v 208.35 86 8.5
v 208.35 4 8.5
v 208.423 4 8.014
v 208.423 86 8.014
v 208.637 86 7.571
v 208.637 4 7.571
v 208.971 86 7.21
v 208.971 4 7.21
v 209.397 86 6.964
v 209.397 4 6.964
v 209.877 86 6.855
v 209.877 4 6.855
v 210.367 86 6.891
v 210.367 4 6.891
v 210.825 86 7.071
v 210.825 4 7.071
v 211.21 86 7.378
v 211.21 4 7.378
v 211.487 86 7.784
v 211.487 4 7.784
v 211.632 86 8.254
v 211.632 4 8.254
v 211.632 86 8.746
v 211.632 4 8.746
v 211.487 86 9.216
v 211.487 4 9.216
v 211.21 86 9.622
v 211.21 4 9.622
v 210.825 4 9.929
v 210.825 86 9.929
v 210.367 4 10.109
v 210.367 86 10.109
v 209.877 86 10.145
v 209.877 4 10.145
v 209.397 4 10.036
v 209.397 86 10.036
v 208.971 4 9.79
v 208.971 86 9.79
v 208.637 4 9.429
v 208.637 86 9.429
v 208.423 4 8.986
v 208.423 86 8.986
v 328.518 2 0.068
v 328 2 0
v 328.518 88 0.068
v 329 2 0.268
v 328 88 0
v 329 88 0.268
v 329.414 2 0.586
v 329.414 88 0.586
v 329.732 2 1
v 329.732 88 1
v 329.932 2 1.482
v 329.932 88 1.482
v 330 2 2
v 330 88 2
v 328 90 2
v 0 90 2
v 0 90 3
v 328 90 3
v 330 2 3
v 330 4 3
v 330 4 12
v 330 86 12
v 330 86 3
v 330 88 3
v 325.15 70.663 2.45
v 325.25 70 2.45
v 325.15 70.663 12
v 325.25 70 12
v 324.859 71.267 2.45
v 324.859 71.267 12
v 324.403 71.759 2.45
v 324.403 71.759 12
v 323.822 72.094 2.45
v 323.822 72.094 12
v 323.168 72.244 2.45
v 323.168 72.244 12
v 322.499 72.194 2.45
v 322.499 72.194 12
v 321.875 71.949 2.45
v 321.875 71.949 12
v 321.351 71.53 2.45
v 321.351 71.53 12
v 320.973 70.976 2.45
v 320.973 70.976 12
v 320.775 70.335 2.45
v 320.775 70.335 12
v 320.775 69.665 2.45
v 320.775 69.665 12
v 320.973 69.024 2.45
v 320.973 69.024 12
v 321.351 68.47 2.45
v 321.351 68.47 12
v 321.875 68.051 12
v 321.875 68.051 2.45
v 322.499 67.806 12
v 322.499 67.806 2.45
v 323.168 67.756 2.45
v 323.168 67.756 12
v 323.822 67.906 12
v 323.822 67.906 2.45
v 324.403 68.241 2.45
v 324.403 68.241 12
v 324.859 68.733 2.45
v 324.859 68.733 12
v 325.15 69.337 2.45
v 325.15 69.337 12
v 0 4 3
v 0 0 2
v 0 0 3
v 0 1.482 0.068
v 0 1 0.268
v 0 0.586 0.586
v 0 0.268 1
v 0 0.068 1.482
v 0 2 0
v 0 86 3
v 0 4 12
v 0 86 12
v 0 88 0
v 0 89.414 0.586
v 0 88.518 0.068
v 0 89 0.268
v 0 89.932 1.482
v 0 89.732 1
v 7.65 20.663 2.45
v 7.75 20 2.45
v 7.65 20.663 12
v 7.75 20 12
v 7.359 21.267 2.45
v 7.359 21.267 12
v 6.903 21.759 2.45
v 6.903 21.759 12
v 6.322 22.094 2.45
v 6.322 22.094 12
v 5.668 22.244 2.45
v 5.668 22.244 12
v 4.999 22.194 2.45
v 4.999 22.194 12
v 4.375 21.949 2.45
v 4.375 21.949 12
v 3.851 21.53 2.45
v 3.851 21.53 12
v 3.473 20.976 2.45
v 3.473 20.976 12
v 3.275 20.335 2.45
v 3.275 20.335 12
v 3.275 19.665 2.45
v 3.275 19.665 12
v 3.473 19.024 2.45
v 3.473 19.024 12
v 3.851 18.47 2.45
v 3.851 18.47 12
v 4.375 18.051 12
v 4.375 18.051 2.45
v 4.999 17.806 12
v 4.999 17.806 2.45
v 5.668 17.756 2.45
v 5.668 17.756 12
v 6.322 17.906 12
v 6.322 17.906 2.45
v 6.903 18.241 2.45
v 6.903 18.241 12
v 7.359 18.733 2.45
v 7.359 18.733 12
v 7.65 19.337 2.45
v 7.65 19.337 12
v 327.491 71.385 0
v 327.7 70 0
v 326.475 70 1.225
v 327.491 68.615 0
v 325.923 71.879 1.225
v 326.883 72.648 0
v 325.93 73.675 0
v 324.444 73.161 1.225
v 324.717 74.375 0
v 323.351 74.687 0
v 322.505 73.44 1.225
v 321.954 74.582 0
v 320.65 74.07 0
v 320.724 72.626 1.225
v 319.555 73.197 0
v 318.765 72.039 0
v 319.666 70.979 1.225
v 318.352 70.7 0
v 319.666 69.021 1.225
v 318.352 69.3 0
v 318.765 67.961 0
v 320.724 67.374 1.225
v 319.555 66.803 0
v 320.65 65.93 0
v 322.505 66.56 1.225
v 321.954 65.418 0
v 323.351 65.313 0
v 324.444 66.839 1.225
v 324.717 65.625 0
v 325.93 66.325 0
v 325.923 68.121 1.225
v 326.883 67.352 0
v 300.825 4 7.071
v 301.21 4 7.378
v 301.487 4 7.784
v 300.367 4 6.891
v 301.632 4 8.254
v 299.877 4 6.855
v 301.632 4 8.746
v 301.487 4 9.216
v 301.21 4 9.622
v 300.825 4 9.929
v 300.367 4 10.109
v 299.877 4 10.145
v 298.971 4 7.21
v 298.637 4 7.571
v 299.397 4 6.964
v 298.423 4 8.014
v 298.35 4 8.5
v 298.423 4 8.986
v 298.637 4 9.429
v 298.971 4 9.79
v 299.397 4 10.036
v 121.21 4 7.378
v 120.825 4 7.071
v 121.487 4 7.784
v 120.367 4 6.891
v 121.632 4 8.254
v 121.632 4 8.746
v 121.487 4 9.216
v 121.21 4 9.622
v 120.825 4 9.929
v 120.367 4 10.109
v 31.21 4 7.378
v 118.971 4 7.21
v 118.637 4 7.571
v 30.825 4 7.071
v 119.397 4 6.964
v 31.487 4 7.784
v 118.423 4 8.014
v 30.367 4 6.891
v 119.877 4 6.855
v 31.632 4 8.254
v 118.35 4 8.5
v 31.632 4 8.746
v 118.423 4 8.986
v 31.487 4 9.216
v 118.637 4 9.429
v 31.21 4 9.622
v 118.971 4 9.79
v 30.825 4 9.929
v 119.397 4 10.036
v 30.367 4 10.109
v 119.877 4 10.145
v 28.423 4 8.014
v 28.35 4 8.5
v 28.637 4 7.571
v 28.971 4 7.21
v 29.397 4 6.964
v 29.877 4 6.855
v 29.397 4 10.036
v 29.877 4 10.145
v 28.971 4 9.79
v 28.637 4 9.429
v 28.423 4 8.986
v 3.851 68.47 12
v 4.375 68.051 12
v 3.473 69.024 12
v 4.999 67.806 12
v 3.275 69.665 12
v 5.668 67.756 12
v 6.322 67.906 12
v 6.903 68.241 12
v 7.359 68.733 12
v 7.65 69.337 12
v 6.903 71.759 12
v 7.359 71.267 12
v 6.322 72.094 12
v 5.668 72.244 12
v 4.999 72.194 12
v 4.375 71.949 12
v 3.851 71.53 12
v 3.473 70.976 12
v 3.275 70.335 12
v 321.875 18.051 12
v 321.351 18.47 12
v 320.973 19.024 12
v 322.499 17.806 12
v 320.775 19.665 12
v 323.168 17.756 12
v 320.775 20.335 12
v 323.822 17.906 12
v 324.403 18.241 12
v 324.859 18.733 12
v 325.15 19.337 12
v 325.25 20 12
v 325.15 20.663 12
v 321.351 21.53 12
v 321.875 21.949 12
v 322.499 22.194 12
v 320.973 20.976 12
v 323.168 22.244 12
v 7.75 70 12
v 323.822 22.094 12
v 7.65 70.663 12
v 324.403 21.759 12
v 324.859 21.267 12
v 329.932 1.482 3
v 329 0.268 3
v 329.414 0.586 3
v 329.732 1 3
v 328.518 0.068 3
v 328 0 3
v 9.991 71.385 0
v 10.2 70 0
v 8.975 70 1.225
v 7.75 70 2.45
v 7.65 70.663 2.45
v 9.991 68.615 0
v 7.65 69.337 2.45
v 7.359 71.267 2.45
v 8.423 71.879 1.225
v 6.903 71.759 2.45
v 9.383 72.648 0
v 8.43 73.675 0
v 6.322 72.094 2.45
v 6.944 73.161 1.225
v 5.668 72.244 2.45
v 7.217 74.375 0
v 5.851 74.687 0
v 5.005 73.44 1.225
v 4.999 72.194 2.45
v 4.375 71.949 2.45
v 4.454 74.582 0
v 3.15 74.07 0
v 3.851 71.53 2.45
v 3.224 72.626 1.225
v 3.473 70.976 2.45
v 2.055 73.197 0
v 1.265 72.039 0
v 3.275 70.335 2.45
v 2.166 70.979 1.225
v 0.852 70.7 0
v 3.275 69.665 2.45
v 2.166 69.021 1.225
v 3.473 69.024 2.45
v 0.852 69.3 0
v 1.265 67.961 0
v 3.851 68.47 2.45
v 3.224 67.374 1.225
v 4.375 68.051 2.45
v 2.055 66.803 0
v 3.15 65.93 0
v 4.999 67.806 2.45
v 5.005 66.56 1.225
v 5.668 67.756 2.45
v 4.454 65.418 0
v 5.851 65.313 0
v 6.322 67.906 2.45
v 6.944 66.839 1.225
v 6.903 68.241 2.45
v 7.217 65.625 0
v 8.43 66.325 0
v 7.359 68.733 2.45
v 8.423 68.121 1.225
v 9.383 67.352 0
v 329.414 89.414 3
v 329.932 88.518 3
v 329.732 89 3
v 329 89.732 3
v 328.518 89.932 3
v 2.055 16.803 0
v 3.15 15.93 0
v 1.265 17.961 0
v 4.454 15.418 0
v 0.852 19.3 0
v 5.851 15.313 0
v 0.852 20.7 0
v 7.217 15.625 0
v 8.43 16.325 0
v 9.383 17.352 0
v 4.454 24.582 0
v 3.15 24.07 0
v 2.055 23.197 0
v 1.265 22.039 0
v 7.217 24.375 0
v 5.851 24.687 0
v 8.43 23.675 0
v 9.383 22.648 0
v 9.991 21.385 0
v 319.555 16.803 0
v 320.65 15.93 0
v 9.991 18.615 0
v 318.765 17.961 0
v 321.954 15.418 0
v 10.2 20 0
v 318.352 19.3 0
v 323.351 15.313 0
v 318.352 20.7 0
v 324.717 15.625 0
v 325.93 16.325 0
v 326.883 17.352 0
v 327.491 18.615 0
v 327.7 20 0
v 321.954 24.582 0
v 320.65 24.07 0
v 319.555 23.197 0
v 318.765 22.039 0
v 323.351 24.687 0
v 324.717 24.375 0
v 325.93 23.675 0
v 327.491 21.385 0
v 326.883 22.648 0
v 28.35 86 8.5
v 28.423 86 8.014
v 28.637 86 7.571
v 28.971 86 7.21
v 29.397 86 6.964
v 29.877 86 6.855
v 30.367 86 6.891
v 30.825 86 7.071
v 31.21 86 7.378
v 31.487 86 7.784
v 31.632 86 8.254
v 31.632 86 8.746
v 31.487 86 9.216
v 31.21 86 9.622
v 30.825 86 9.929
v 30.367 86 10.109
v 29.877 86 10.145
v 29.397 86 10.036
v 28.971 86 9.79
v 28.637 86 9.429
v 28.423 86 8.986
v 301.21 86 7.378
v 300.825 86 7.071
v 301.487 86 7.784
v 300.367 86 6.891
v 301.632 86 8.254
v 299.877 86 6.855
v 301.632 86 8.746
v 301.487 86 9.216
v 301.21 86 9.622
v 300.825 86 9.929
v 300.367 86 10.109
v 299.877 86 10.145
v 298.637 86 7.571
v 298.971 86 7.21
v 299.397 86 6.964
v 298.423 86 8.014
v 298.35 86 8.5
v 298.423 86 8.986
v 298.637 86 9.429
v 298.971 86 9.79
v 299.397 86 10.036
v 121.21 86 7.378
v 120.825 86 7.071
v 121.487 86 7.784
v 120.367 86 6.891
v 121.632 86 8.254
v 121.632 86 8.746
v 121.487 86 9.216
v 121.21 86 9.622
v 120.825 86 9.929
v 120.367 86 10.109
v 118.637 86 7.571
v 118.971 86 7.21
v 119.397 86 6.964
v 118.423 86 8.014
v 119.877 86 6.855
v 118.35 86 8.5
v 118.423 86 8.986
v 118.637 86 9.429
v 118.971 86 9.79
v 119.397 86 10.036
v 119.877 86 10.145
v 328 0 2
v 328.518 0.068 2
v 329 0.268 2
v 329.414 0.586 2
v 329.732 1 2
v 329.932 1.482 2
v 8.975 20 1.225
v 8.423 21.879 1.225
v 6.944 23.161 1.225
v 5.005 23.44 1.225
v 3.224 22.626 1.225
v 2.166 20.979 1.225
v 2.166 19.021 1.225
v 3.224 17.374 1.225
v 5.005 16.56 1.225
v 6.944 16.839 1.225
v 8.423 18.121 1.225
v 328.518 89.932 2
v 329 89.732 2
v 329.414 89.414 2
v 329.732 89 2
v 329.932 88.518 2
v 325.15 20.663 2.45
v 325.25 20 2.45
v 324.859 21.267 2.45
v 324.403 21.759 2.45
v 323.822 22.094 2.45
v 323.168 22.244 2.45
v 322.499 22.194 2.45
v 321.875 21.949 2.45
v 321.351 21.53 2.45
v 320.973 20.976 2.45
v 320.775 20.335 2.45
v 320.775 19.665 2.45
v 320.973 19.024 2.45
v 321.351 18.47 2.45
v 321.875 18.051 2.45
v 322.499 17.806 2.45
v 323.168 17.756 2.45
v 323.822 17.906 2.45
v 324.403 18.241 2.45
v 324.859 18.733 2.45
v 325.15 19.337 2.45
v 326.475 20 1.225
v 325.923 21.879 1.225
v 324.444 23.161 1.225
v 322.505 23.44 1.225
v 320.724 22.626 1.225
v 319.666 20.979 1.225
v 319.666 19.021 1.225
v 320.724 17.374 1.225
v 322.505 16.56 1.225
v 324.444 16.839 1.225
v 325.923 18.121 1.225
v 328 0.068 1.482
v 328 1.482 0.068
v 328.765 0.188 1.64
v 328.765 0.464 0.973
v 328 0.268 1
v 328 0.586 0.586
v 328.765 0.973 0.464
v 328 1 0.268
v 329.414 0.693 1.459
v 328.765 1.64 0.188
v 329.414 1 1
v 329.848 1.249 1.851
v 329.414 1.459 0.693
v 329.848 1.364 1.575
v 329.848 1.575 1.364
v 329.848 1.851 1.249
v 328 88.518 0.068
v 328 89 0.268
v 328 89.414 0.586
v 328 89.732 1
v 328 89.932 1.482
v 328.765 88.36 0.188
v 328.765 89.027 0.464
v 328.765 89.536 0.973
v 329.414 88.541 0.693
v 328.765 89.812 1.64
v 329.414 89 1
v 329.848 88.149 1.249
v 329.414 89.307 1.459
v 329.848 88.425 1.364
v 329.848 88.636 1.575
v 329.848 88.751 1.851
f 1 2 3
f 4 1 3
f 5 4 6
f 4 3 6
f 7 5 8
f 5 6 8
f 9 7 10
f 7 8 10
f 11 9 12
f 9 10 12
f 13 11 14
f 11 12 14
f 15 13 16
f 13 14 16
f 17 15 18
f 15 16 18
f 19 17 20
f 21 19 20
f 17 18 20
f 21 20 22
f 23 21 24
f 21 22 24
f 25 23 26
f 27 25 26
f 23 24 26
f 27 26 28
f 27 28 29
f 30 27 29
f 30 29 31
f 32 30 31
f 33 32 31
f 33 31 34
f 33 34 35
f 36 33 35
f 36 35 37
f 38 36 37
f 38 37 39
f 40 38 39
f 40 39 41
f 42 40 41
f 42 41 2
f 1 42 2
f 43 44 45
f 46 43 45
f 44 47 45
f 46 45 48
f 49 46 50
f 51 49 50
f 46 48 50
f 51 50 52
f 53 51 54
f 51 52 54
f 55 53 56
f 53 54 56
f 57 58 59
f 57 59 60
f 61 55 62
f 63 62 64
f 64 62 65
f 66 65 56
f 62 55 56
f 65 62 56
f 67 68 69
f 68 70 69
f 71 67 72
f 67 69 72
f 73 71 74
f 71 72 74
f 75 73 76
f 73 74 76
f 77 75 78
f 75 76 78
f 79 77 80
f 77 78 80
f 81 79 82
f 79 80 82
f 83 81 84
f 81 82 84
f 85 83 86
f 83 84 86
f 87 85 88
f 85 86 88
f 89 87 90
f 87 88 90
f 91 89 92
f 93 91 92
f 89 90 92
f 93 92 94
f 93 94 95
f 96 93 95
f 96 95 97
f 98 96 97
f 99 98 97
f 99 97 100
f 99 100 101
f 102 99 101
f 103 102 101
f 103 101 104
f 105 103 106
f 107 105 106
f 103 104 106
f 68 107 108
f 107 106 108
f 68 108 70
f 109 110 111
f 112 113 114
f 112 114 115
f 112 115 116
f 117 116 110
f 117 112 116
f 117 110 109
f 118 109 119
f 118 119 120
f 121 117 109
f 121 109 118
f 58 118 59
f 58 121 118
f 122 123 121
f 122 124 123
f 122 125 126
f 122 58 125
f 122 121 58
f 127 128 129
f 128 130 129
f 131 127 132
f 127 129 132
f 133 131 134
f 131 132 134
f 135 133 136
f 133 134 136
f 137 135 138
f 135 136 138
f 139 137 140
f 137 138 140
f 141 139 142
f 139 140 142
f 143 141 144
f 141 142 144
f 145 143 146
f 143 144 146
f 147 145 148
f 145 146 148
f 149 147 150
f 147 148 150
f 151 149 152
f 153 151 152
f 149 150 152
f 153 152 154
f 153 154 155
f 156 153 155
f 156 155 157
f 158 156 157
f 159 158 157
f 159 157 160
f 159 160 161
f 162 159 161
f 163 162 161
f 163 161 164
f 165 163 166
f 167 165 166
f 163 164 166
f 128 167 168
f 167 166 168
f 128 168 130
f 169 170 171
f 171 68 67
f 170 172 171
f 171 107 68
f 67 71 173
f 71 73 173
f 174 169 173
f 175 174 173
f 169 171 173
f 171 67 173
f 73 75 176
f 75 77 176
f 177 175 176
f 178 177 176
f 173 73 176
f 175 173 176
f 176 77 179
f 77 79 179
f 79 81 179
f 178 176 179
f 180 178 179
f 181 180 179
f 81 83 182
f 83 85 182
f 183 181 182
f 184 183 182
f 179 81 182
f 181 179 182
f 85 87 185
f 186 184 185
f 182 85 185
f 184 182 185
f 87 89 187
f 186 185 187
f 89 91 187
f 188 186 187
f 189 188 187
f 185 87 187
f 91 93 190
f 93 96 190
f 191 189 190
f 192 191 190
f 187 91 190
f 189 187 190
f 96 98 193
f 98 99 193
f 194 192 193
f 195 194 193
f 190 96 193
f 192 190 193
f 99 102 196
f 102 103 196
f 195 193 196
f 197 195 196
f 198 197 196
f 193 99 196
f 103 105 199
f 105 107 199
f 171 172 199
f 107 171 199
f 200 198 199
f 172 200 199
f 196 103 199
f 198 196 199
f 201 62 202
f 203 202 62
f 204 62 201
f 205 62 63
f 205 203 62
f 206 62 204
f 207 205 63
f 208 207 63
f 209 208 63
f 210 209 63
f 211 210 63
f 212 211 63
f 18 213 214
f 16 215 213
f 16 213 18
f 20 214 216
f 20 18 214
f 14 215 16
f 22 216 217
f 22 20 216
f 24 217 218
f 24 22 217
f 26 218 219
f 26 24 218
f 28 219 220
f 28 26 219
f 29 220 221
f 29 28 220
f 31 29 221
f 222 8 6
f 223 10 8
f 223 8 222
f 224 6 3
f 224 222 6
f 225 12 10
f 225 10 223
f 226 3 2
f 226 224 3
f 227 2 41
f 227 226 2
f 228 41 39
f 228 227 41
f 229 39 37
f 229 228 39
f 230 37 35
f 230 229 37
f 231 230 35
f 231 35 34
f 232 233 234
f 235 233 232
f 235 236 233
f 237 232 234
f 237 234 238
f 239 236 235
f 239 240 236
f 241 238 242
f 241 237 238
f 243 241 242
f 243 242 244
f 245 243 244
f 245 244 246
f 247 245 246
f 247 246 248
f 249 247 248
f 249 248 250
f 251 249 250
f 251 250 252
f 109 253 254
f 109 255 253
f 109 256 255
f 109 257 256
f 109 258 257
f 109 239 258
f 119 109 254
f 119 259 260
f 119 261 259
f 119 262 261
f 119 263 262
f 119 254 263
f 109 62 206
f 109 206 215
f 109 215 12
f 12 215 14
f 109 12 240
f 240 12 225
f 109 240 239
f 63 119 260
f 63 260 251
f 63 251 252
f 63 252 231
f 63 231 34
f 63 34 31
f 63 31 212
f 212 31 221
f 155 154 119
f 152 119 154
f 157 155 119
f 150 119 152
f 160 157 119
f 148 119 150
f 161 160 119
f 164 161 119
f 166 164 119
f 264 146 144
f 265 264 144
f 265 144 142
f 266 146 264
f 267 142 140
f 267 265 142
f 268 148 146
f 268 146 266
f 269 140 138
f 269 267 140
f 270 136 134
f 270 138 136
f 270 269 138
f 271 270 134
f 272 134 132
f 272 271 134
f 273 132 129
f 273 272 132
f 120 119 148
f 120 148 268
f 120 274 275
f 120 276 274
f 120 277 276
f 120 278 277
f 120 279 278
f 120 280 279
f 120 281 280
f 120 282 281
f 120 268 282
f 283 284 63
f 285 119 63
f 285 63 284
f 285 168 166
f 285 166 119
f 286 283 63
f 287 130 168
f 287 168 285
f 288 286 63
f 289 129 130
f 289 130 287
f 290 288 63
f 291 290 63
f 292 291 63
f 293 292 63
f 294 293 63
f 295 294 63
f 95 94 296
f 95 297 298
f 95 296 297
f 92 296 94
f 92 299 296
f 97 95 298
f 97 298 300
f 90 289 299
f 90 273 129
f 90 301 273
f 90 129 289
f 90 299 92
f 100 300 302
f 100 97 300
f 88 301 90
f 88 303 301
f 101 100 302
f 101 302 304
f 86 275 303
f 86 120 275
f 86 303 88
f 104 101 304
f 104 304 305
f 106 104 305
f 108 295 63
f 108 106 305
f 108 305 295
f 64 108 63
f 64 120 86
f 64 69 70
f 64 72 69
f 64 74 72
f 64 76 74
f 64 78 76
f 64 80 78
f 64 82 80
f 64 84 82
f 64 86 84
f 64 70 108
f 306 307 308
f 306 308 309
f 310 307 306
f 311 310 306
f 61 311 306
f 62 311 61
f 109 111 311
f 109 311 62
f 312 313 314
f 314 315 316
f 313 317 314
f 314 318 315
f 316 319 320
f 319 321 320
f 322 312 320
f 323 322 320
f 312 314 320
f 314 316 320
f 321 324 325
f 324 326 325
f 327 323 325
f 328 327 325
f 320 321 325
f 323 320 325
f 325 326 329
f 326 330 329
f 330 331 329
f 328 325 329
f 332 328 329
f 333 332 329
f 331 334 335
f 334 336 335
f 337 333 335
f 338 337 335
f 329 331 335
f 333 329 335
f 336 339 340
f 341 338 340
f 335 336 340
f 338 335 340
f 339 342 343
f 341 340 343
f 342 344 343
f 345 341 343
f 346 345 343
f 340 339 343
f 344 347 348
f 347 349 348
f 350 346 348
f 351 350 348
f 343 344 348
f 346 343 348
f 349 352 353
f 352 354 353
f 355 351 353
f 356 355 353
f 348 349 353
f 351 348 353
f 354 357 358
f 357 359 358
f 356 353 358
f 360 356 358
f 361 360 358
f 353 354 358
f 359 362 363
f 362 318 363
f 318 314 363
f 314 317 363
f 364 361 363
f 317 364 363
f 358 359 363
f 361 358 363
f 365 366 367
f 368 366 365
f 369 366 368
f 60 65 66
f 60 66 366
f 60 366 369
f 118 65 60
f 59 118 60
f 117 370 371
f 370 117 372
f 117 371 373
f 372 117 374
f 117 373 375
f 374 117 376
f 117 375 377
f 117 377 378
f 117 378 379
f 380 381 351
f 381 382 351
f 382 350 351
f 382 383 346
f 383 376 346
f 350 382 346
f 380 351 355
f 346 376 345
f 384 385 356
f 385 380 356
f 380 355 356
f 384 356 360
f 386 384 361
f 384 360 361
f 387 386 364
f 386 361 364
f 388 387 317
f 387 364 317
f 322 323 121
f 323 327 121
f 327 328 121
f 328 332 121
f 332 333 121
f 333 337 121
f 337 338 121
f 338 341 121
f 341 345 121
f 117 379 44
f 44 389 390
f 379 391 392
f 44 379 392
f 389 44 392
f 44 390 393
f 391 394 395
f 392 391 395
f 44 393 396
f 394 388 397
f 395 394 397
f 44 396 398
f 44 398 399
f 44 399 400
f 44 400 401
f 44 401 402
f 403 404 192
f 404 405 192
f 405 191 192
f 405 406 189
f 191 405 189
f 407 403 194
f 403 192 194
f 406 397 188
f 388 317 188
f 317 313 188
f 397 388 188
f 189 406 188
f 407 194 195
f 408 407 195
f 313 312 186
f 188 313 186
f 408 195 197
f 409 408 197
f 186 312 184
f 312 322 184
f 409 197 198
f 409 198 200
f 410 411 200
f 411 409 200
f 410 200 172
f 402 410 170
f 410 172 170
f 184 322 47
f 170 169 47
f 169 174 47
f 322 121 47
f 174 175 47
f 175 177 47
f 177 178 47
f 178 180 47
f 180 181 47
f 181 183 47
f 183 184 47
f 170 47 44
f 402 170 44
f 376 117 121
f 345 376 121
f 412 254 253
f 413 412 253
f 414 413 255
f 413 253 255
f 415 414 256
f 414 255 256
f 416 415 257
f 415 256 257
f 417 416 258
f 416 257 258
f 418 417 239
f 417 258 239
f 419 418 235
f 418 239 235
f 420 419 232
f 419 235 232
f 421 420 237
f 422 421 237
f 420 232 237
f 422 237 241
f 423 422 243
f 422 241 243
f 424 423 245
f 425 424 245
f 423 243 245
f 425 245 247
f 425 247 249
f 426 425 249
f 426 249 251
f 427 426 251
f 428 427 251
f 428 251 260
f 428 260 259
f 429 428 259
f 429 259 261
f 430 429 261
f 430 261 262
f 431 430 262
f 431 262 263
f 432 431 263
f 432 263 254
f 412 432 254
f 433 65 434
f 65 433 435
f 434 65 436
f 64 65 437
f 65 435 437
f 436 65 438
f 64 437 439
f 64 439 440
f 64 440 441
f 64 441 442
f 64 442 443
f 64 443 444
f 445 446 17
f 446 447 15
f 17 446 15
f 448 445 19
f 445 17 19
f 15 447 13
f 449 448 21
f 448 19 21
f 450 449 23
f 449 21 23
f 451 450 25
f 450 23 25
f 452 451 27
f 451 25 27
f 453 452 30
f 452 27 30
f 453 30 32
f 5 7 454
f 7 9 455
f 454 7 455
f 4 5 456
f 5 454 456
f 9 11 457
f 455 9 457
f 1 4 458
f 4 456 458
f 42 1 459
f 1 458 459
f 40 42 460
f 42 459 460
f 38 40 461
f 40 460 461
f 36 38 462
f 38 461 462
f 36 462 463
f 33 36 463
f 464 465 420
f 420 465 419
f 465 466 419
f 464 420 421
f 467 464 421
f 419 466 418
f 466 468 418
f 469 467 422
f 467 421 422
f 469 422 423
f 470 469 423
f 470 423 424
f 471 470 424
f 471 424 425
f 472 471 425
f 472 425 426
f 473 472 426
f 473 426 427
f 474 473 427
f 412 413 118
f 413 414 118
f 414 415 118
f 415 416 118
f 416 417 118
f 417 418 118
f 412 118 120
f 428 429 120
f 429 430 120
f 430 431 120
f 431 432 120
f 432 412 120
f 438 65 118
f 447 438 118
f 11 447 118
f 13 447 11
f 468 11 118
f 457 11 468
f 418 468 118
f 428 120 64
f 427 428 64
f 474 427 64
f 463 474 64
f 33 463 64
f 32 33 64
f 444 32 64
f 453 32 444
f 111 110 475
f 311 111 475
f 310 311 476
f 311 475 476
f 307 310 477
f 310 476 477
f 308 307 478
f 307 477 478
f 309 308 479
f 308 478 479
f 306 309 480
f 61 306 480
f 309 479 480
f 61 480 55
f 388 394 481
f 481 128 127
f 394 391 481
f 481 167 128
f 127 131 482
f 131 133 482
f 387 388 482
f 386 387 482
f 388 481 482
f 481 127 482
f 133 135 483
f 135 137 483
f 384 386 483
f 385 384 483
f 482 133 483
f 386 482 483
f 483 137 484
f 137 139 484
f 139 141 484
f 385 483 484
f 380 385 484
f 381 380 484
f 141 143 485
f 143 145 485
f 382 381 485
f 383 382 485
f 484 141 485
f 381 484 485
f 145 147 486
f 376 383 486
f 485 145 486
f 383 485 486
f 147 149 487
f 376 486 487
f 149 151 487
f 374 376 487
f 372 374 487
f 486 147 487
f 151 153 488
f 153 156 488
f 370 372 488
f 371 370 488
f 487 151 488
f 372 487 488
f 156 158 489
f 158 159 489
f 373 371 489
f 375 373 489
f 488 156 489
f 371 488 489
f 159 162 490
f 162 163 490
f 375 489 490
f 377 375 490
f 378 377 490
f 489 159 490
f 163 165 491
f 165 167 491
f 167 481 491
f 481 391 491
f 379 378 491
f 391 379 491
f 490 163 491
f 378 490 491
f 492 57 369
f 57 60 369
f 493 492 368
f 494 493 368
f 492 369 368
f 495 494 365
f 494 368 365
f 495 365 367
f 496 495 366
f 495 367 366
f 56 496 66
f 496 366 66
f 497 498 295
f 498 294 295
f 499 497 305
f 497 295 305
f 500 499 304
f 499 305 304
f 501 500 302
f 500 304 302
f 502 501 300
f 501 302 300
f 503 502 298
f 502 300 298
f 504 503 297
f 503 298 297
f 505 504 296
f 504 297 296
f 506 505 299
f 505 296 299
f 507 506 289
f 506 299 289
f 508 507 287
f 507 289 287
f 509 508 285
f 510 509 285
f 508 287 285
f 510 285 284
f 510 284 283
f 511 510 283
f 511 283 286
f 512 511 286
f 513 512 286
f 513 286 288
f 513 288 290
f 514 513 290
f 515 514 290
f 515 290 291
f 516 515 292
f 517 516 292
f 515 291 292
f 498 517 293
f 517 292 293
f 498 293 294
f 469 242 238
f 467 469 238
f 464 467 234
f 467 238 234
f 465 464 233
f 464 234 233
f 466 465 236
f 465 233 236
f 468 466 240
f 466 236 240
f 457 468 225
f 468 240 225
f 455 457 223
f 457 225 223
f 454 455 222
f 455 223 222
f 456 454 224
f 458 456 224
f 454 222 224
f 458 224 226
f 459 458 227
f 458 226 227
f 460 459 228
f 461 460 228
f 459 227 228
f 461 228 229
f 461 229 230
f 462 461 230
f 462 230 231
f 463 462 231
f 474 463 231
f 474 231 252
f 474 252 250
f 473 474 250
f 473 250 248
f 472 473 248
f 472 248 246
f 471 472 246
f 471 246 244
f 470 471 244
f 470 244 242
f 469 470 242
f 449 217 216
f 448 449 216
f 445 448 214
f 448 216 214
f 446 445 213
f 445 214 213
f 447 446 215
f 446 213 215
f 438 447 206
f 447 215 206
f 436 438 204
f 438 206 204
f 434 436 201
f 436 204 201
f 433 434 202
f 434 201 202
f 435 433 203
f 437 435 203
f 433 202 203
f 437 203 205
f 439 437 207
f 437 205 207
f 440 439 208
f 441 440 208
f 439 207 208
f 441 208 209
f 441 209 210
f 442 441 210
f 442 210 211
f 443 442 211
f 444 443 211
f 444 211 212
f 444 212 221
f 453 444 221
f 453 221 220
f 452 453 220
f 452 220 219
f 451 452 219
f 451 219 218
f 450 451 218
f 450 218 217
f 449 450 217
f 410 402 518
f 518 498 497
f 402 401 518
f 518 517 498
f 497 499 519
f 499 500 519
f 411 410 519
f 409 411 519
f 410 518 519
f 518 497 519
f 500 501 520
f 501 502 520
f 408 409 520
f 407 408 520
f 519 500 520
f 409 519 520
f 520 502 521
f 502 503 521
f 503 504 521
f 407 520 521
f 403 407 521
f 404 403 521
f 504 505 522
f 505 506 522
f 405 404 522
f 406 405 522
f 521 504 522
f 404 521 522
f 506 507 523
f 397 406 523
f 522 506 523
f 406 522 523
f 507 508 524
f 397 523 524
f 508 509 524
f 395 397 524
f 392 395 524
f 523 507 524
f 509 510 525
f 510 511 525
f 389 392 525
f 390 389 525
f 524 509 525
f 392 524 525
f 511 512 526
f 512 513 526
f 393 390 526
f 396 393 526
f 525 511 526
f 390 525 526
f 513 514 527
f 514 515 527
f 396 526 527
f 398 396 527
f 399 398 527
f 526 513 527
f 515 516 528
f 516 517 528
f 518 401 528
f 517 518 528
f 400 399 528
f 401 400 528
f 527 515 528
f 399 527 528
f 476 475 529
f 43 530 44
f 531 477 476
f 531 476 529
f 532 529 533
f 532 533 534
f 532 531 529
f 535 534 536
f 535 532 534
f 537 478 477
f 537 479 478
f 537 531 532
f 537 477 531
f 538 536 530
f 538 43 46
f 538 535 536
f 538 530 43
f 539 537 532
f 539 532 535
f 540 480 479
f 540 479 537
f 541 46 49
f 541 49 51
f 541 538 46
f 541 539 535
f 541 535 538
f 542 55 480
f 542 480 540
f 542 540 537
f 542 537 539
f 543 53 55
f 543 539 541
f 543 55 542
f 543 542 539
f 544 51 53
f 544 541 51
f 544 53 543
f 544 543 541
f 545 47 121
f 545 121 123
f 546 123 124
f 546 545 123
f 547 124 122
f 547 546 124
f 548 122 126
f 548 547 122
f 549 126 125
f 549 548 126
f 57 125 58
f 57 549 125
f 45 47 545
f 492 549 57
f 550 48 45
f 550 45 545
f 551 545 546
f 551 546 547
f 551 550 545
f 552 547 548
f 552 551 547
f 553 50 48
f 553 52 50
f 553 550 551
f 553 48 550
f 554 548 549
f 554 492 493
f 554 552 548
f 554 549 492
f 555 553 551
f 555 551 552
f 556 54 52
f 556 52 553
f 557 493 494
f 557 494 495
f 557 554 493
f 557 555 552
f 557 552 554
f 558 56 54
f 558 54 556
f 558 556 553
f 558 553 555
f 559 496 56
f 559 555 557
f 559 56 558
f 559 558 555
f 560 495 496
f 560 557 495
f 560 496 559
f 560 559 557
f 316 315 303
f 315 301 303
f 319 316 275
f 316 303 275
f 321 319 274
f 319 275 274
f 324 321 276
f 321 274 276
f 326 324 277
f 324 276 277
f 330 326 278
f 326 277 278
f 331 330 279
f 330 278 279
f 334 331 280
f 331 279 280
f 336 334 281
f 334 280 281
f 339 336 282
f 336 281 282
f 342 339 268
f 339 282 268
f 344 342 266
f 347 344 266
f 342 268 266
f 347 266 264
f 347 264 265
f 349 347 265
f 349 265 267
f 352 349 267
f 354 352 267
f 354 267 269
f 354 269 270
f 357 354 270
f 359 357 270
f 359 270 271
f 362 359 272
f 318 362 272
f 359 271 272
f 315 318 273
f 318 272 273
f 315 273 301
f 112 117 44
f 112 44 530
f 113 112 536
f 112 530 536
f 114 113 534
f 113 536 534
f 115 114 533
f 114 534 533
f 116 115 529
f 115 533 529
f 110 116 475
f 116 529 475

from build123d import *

# Parameters (mm, degrees)
SKETCH_1_W                     = 330
SKETCH_1_H                     = 90
EXTRUDE_1_DEPTH                = 12
SKETCH_2_W                     = 9
SKETCH_2_H                     = 4
CUT_EXTRUDE_1_DEPTH            = 331
FILLET_1_R                     = 2
FILLET_2_R                     = 2
HOLE_WIZARD_M4_1_D             = 3.3
HOLE_WIZARD_M4_1_2_D           = 4.5
HOLE_WIZARD_M4_1_2_CSINK_D     = 9.4
HOLE_WIZARD_M4_1_2_CSINK_ANGLE = 90


with BuildPart() as part:
    # 草圖1 → 填料-伸長1 (new body)
    with BuildSketch(Plane.XY):
        with Locations((165, 45)):
            Rectangle(SKETCH_1_W, SKETCH_1_H)
    extrude(amount=EXTRUDE_1_DEPTH)

    # 草圖2 → 除料-伸長1 (cut, through all)
    with BuildSketch(Plane.ZY):
        with Locations((7.5, 88)):
            Rectangle(SKETCH_2_W, SKETCH_2_H)
        with Locations((7.5, 2)):
            Rectangle(SKETCH_2_W, SKETCH_2_H)
    extrude(amount=-CUT_EXTRUDE_1_DEPTH, mode=Mode.SUBTRACT)

    # 圓角1
    fillet_1_edges = [part.edges().sort_by_distance(p)[0] for p in [
        (165, 90, 0),
        (165, 0, 0),
    ]]
    fillet(fillet_1_edges, radius=FILLET_1_R)

    # 圓角2
    fillet_2_edges = [part.edges().sort_by_distance(p)[0] for p in [
        (330, 90, 2.5),
        (330, 0, 2.5),
        (330, 45, 0),
        (330, 89.414213562, 0.585786438),
        (330, 0.585786438, 0.585786438),
    ]]
    fillet(fillet_2_edges, radius=FILLET_2_R)

    # Hole Wizard M4 _1 (through all)
    with Locations(Plane(origin=(0, 86, 0), x_dir=(1, 0, 0), z_dir=(0, 1, 0))):
        with Locations((30, -8.5), (120, -8.5), (210, -8.5), (300, -8.5)):
            Hole(HOLE_WIZARD_M4_1_D / 2)

    # Hole Wizard M4 _1 2 (through all)
    with Locations(Plane(origin=(0, 0, 0), x_dir=(-1, 0, 0), z_dir=(0, 0, -1))):
        with Locations((-323, 20), (-323, 70), (-5.5, 20), (-5.5, 70)):
            CounterSinkHole(HOLE_WIZARD_M4_1_2_D / 2, HOLE_WIZARD_M4_1_2_CSINK_D / 2, counter_sink_angle=HOLE_WIZARD_M4_1_2_CSINK_ANGLE)


solid = part.part
